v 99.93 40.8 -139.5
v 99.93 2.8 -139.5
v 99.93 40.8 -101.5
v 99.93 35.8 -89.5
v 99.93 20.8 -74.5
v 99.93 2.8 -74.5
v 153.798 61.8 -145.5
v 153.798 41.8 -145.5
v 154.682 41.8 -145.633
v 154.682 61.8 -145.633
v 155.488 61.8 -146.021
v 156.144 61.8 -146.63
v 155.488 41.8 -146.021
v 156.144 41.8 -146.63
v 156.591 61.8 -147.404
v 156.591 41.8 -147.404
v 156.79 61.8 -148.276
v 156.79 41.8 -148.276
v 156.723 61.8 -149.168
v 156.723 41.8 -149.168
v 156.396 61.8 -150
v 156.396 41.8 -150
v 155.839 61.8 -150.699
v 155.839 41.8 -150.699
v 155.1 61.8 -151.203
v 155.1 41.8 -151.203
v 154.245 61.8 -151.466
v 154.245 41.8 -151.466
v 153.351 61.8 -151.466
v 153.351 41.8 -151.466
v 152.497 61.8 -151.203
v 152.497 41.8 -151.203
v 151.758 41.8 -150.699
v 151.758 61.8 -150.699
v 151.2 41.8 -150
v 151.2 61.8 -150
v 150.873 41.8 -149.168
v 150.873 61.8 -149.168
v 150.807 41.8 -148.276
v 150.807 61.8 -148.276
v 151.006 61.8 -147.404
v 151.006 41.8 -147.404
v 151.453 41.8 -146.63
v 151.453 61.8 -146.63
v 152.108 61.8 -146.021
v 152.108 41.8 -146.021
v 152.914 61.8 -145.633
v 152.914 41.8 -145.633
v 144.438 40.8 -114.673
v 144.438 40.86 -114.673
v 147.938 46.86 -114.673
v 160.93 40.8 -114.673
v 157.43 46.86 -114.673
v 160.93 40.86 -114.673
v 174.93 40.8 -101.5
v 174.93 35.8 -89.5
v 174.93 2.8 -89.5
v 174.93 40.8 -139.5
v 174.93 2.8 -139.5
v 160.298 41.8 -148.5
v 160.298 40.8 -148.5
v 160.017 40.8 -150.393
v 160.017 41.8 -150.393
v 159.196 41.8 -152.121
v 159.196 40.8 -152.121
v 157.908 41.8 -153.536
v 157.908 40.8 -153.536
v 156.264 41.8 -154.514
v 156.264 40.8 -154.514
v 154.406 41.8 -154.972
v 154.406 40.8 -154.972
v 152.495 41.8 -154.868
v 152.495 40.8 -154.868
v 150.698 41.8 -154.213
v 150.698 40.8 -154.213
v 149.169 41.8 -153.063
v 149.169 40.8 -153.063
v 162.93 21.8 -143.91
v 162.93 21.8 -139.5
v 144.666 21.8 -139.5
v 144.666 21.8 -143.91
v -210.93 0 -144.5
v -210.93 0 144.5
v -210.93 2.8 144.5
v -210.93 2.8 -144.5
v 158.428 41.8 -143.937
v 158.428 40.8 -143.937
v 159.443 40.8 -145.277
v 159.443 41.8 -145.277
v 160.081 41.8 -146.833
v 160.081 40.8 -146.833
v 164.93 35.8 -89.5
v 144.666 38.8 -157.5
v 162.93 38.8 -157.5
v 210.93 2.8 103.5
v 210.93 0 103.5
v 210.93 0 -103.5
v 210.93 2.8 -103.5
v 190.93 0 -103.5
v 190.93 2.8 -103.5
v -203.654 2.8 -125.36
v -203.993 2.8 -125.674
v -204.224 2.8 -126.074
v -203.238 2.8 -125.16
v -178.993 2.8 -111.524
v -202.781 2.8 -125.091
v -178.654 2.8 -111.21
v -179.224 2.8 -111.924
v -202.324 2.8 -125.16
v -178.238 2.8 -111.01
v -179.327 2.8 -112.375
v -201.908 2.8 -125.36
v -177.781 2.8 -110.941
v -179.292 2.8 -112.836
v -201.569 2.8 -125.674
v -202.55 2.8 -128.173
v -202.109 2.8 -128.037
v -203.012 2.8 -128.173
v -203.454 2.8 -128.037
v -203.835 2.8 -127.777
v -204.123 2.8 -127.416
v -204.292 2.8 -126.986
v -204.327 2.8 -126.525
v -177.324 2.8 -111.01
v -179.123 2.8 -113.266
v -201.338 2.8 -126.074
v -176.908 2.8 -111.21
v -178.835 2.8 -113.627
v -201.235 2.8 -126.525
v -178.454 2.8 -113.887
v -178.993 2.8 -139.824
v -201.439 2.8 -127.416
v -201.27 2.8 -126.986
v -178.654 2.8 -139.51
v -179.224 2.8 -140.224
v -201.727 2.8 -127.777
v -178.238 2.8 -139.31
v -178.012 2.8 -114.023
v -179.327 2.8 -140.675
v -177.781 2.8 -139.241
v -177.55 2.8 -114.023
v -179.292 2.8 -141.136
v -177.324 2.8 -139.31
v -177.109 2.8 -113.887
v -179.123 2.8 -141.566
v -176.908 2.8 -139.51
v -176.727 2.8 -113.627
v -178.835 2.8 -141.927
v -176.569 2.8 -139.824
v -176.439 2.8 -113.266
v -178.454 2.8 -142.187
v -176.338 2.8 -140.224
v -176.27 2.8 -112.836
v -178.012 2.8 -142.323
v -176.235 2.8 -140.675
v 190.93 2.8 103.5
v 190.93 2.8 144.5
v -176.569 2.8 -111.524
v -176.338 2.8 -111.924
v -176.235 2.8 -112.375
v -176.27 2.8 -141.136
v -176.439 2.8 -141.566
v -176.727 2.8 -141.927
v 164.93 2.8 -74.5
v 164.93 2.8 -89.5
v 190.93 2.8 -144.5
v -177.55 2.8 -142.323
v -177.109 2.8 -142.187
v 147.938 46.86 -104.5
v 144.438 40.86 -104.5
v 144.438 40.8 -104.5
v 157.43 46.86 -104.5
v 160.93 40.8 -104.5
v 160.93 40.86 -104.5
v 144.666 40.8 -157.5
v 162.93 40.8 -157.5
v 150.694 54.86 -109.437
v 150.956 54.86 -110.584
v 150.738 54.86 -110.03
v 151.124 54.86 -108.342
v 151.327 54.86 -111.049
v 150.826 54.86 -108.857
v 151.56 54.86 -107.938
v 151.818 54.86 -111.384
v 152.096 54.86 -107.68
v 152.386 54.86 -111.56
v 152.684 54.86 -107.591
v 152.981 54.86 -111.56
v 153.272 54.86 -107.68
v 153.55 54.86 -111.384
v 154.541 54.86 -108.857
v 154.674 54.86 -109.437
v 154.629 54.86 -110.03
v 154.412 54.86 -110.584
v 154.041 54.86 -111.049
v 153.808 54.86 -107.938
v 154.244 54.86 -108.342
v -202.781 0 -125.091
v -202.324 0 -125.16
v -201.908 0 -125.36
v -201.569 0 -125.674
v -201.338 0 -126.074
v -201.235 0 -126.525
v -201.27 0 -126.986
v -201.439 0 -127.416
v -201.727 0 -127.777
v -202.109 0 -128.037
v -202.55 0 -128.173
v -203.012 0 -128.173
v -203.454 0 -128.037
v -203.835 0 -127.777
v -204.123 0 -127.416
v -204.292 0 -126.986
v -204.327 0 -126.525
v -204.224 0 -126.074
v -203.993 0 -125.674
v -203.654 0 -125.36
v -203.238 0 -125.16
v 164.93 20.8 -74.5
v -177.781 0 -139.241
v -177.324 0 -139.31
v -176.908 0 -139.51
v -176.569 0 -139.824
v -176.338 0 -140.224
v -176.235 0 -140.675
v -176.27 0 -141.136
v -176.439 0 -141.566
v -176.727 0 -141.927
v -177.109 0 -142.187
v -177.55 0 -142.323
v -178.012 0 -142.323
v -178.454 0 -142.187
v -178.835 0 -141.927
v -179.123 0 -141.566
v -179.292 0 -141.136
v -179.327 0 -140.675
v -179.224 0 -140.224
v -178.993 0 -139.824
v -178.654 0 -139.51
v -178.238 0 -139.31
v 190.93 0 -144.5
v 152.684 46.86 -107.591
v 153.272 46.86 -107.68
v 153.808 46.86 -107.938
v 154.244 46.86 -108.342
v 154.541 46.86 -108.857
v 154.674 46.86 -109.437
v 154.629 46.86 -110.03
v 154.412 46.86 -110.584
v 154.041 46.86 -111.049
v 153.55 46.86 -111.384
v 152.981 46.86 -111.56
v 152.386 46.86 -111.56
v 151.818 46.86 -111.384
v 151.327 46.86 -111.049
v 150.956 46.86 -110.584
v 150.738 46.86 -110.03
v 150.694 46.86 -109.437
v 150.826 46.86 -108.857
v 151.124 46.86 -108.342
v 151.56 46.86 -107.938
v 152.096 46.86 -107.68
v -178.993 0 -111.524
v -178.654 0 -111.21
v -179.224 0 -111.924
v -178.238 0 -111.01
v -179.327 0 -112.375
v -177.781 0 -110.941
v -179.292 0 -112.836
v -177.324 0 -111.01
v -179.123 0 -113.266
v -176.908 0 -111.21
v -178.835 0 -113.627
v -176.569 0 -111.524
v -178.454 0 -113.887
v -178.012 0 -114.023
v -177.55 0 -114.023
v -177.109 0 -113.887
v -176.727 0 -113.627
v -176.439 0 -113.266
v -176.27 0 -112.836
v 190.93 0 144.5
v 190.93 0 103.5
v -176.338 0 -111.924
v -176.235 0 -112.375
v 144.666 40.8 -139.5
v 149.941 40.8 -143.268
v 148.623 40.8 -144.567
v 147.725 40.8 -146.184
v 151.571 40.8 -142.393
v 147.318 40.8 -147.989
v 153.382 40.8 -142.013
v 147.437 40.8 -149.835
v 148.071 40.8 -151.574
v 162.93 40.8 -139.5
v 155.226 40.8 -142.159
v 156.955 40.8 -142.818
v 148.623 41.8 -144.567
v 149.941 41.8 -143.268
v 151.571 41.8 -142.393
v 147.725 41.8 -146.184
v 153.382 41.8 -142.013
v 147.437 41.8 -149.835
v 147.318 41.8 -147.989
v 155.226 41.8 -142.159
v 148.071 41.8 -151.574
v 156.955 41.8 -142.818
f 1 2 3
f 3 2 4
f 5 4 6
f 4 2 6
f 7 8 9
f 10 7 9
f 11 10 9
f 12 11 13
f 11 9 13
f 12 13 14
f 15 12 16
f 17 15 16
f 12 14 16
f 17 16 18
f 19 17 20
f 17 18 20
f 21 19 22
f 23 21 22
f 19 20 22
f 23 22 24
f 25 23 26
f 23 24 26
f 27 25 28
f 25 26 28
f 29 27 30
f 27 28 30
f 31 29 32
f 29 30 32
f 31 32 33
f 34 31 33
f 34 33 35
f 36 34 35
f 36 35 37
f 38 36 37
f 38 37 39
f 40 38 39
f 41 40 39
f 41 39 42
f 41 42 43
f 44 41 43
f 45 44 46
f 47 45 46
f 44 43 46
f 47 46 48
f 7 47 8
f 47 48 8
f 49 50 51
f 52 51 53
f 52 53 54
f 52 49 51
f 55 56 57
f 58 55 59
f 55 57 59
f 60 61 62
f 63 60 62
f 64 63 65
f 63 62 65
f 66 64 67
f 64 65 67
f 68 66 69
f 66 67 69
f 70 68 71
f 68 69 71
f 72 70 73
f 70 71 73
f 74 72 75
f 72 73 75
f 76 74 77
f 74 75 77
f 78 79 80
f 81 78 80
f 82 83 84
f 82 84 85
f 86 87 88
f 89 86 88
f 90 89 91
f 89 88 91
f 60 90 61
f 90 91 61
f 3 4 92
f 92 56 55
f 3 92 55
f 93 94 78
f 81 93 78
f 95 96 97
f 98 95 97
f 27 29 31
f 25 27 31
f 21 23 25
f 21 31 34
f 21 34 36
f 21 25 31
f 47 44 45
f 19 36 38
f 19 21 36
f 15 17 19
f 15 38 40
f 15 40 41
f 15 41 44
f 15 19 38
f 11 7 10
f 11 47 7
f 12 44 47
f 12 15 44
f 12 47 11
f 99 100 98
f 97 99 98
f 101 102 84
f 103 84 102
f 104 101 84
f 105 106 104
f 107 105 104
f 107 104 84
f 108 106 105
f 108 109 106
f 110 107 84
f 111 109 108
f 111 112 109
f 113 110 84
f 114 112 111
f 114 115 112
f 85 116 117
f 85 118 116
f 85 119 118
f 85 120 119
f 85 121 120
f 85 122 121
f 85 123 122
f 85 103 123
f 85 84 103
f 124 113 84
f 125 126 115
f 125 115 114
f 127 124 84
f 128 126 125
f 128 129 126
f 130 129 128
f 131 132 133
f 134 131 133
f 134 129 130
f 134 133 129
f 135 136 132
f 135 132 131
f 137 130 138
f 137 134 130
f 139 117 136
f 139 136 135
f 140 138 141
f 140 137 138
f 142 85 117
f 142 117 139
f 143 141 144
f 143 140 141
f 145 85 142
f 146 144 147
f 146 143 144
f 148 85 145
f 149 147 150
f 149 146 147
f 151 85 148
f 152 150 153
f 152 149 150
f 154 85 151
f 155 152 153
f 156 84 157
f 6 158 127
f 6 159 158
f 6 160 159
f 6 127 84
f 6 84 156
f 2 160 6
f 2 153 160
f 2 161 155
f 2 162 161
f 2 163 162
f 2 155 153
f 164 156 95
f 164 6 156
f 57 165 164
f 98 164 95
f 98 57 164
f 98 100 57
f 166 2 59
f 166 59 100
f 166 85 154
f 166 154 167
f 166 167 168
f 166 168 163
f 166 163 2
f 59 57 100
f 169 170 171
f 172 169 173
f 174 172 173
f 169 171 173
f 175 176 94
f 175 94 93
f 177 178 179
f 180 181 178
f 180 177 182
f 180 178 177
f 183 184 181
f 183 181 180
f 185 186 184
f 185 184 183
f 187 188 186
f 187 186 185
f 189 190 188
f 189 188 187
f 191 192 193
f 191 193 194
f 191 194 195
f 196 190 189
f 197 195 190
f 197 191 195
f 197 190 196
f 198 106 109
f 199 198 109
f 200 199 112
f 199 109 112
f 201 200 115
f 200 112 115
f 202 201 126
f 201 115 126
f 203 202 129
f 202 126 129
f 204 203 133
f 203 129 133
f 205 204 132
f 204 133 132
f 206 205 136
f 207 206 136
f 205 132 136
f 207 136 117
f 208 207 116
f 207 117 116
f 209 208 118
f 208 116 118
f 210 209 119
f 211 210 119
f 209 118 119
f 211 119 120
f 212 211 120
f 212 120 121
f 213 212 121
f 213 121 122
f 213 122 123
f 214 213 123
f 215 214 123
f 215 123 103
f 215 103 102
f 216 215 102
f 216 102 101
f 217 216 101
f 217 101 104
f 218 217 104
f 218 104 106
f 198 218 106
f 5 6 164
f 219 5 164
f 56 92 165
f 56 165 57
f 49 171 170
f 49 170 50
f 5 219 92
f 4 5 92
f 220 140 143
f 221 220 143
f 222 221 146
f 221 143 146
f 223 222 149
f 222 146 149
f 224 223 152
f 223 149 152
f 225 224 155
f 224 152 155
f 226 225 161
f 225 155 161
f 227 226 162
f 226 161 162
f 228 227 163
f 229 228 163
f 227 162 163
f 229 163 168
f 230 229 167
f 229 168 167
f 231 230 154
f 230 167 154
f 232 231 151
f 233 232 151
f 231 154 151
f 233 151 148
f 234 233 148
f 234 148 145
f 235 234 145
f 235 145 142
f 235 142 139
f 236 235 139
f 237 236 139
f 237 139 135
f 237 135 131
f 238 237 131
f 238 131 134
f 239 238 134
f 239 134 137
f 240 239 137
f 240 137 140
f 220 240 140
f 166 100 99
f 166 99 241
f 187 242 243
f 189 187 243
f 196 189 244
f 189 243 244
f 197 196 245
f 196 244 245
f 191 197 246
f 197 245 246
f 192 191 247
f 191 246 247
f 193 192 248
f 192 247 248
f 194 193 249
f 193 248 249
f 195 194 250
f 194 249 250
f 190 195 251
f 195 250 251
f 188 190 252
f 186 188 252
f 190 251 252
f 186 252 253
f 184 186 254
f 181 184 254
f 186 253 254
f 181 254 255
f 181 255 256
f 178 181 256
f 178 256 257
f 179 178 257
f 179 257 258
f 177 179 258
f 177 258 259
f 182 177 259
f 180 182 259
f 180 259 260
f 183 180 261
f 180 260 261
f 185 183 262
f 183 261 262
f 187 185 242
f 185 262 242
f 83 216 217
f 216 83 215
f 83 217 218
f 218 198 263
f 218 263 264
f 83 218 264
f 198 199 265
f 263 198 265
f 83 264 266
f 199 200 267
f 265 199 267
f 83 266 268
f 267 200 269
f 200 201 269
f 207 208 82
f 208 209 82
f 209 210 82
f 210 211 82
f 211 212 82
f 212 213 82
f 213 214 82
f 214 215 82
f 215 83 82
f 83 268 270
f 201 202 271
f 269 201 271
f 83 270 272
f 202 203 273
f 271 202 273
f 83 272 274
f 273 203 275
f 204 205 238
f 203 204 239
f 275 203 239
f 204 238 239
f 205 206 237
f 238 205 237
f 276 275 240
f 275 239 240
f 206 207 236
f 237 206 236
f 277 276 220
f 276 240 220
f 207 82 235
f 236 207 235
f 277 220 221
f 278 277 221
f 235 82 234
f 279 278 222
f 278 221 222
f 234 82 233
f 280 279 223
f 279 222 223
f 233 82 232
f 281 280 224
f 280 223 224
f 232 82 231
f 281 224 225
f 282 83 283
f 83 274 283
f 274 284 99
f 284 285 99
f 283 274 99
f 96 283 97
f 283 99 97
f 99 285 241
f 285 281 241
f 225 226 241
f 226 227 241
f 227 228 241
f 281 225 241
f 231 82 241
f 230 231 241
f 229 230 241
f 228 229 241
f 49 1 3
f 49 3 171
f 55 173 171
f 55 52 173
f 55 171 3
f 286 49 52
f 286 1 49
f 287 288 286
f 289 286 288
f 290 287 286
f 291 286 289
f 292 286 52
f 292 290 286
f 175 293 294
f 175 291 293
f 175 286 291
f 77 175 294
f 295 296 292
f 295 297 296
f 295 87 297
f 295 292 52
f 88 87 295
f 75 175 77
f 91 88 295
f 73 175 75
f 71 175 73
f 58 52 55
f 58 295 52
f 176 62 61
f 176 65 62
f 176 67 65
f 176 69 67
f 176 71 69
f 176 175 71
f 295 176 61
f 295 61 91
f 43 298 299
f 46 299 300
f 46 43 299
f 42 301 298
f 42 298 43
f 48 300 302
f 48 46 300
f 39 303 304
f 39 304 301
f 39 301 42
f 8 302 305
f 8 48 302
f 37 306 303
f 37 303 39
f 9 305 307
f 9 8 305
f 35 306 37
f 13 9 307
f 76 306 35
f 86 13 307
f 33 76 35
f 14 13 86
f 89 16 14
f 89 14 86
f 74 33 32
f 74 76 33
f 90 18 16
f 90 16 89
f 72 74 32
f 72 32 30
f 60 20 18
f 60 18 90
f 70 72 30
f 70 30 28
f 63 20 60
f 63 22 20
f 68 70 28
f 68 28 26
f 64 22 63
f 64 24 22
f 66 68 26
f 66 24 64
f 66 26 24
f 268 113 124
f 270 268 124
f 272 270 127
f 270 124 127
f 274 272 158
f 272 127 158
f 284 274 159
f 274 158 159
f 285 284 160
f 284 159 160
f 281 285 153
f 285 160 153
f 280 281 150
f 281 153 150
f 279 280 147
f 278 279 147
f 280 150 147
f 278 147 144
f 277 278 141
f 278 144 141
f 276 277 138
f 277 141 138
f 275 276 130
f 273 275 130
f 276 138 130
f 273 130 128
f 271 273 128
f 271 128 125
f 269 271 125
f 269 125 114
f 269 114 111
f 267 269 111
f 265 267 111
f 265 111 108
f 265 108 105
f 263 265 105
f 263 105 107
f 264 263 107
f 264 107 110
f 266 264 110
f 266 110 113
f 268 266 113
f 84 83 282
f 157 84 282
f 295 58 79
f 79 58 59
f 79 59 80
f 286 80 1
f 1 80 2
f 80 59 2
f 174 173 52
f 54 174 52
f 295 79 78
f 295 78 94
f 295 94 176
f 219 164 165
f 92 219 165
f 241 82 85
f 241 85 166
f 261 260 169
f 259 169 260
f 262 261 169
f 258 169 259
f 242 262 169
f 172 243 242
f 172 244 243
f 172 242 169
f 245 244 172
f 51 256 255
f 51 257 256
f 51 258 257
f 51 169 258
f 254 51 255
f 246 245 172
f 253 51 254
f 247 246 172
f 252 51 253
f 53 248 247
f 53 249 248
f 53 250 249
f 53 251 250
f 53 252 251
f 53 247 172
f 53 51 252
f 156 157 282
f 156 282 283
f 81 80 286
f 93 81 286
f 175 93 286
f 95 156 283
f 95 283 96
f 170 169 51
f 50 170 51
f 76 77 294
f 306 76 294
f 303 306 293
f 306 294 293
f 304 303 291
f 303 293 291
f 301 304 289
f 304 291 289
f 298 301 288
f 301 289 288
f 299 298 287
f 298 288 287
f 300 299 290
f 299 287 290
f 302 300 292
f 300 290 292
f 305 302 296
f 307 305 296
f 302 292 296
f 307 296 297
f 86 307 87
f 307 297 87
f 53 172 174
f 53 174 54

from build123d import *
from OCP.BRepFilletAPI import BRepFilletAPI_MakeChamfer

# Parameters (mm, degrees)
CROQUIS2_W              = 421.86
CROQUIS2_H              = 289
SALIENTE_EXTRUIR1_DEPTH = 2.8
CROQUIS3_W              = 20
CROQUIS3_H              = 41
CORTAR_EXTRUIR1_DEPTH   = 2.8
SALIENTE_EXTRUIR2_DEPTH = 38
CORTAR_EXTRUIR2_DEPTH   = 415.044477804
CORTAR_EXTRUIR3_DEPTH   = 405.741435487
CROQUIS7_W              = 16.492420957
CROQUIS7_H              = 10.17289517
SALIENTE_EXTRUIR3_DEPTH = 6.06
CHAFL_N1_SIZE           = 6
CHAFL_N1_SIZE2          = 3.5
CROQUIS9_R              = 1.995453572
SALIENTE_EXTRUIR4_DEPTH = 8
CROQUIS10_W             = 18.263552833
CROQUIS10_H             = 19
SALIENTE_EXTRUIR5_DEPTH = 18
CORTAR_EXTRUIR4_DEPTH   = 410.374118869
SALIENTE_EXTRUIR6_DEPTH = 1
CROQUIS13_R             = 3
SALIENTE_EXTRUIR7_DEPTH = 20
CROQUIS18_R             = 1.55
CORTAR_EXTRUIR5_DEPTH   = 10


with BuildPart() as part:
    # Croquis2 → Saliente-Extruir1 (new body)
    with BuildSketch(Plane(origin=(0, 0, 0), x_dir=(1, 0, 0), z_dir=(0, 1, 0))):
        Rectangle(CROQUIS2_W, CROQUIS2_H)
    extrude(amount=SALIENTE_EXTRUIR1_DEPTH)

    # Croquis3 → Cortar-Extruir1 (cut)
    with BuildSketch(Plane(origin=(0, 2.8, 0), x_dir=(1, 0, 0), z_dir=(0, 1, 0))):
        with Locations((200.93, -124)):
            Rectangle(CROQUIS3_W, CROQUIS3_H)
        with Locations((200.93, 124)):
            Rectangle(CROQUIS3_W, CROQUIS3_H)
    extrude(amount=-CORTAR_EXTRUIR1_DEPTH, mode=Mode.SUBTRACT)

    # Croquis4 → Saliente-Extruir2 (add)
    with BuildSketch(Plane(origin=(0, 2.8, 0), x_dir=(1, 0, 0), z_dir=(0, 1, 0))):
        Polygon((174.93, 139.5), (99.93, 139.5), (99.93, 89.5), (99.93, 74.5), (164.93, 74.5), (164.93, 89.5), (174.93, 89.5), align=None)
    extrude(amount=SALIENTE_EXTRUIR2_DEPTH)

    # Croquis5 → Cortar-Extruir2 (cut, through all)
    with BuildSketch(Plane(origin=(174.93, 0, 0), x_dir=(0, 0, -1), z_dir=(1, 0, 0))):
        Polygon((89.5, 35.8), (101.5, 40.8), (89.5, 40.8), align=None)
    extrude(amount=-CORTAR_EXTRUIR2_DEPTH, mode=Mode.SUBTRACT)

    # Croquis6 → Cortar-Extruir3 (cut, through all)
    with BuildSketch(Plane(origin=(164.93, 0, 0), x_dir=(0, 0, -1), z_dir=(1, 0, 0))):
        Polygon((74.5, 35.8), (74.5, 20.8), (89.5, 35.8), (89.5, 40.8), (74.5, 40.8), align=None)
    extrude(amount=-CORTAR_EXTRUIR3_DEPTH, mode=Mode.SUBTRACT)

    # Croquis7 → Saliente-Extruir3 (add)
    with BuildSketch(Plane(origin=(0, 40.8, 0), x_dir=(1, 0, 0), z_dir=(0, 1, 0))):
        with Locations((152.683789521, 109.586447585)):
            Rectangle(CROQUIS7_W, CROQUIS7_H)
    extrude(amount=SALIENTE_EXTRUIR3_DEPTH)

    # Chaflán1: one chamfer whose edges measure the first distance from different faces: ONE call of the kernel's chamfer builder (chamfer() names one face for all edges)
    chafl_n1_edges_1 = [part.edges().sort_by_distance(p)[0] for p in [
        (160.93, 46.86, -109.586447585),
    ]]
    chafl_n1_side_1 = [part.faces().sort_by_distance(p)[0] for p in [
        (160.93, 43.83, -109.586447585),
    ]]
    chafl_n1_edges_2 = [part.edges().sort_by_distance(p)[0] for p in [
        (144.437579043, 46.86, -109.586447585),
    ]]
    chafl_n1_side_2 = [part.faces().sort_by_distance(p)[0] for p in [
        (144.437579043, 43.83, -109.586447585),
    ]]
    chafl_n1 = BRepFilletAPI_MakeChamfer(part.part.solid().wrapped)
    for e in chafl_n1_edges_1:
        chafl_n1.Add(CHAFL_N1_SIZE, CHAFL_N1_SIZE2, e.wrapped, chafl_n1_side_1[0].wrapped)  # the first distance lies on this face
    for e in chafl_n1_edges_2:
        chafl_n1.Add(CHAFL_N1_SIZE, CHAFL_N1_SIZE2, e.wrapped, chafl_n1_side_2[0].wrapped)  # the first distance lies on this face
    add(Compound.cast(chafl_n1.Shape()), mode=Mode.REPLACE)

    # Croquis9 → Saliente-Extruir4 (add)
    with BuildSketch(Plane(origin=(0, 46.86, 0), x_dir=(1, 0, 0), z_dir=(0, 1, 0))):
        with Locations(Location((152.683789521, 109.586447585, 0), (0, 0, 270))):
            Circle(CROQUIS9_R)
    extrude(amount=SALIENTE_EXTRUIR4_DEPTH)

    # Croquis10 → Saliente-Extruir5 (add)
    with BuildSketch(Plane(origin=(0, 0, -139.5), x_dir=(-1, 0, 0), z_dir=(0, 0, -1))):
        with Locations((-153.798223584, 31.3)):
            Rectangle(CROQUIS10_W, CROQUIS10_H)
    extrude(amount=SALIENTE_EXTRUIR5_DEPTH)

    # Croquis11 → Cortar-Extruir4 (cut, through all)
    with BuildSketch(Plane(origin=(162.93, 0, 0), x_dir=(0, 0, -1), z_dir=(1, 0, 0))):
        Polygon((157.5, 38.8), (143.909536757, 21.8), (157.5, 21.8), align=None)
    extrude(amount=-CORTAR_EXTRUIR4_DEPTH, mode=Mode.SUBTRACT)

    # Croquis12 → Saliente-Extruir6 (add)
    with BuildSketch(Plane(origin=(0, 40.8, 0), x_dir=(1, 0, 0), z_dir=(0, 1, 0))):
        with BuildLine():
            ThreePointArc((160.298223583, 148.5), (156.263827828, 154.514216134), (149.168747981, 153.062669794))
            Line((149.168747981, 153.062669794), (158.427699186, 143.937330206))
            ThreePointArc((158.427699186, 143.937330206), (159.812439717, 146.034395755), (160.298223583, 148.5))
        make_face()
        with BuildLine():
            Line((158.427699186, 143.937330206), (149.168747981, 153.062669794))
            ThreePointArc((149.168747981, 153.062669794), (149.23555379, 143.870524398), (158.427699186, 143.937330206))
        make_face()
    extrude(amount=SALIENTE_EXTRUIR6_DEPTH)

    # Croquis13 → Saliente-Extruir7 (add)
    with BuildSketch(Plane(origin=(0, 41.8, 0), x_dir=(1, 0, 0), z_dir=(0, 1, 0))):
        with Locations(Location((153.798223583, 148.5, 0), (0, 0, 270))):
            Circle(CROQUIS13_R)
    extrude(amount=SALIENTE_EXTRUIR7_DEPTH)

    # Croquis18 → Cortar-Extruir5 (cut)
    with BuildSketch(Plane(origin=(0, 2.8, 0), x_dir=(1, 0, 0), z_dir=(0, 1, 0))):
        with Locations(Location((-177.78113513, 112.490742036, 0), (0, 0, 270))):
            Circle(CROQUIS18_R)
        with Locations(Location((-177.78113513, 140.790742036, 0), (0, 0, 270))):
            Circle(CROQUIS18_R)
        with Locations(Location((-202.78113513, 126.640742036, 0), (0, 0, 270))):
            Circle(CROQUIS18_R)
    extrude(amount=-CORTAR_EXTRUIR5_DEPTH, mode=Mode.SUBTRACT)


solid = part.part
